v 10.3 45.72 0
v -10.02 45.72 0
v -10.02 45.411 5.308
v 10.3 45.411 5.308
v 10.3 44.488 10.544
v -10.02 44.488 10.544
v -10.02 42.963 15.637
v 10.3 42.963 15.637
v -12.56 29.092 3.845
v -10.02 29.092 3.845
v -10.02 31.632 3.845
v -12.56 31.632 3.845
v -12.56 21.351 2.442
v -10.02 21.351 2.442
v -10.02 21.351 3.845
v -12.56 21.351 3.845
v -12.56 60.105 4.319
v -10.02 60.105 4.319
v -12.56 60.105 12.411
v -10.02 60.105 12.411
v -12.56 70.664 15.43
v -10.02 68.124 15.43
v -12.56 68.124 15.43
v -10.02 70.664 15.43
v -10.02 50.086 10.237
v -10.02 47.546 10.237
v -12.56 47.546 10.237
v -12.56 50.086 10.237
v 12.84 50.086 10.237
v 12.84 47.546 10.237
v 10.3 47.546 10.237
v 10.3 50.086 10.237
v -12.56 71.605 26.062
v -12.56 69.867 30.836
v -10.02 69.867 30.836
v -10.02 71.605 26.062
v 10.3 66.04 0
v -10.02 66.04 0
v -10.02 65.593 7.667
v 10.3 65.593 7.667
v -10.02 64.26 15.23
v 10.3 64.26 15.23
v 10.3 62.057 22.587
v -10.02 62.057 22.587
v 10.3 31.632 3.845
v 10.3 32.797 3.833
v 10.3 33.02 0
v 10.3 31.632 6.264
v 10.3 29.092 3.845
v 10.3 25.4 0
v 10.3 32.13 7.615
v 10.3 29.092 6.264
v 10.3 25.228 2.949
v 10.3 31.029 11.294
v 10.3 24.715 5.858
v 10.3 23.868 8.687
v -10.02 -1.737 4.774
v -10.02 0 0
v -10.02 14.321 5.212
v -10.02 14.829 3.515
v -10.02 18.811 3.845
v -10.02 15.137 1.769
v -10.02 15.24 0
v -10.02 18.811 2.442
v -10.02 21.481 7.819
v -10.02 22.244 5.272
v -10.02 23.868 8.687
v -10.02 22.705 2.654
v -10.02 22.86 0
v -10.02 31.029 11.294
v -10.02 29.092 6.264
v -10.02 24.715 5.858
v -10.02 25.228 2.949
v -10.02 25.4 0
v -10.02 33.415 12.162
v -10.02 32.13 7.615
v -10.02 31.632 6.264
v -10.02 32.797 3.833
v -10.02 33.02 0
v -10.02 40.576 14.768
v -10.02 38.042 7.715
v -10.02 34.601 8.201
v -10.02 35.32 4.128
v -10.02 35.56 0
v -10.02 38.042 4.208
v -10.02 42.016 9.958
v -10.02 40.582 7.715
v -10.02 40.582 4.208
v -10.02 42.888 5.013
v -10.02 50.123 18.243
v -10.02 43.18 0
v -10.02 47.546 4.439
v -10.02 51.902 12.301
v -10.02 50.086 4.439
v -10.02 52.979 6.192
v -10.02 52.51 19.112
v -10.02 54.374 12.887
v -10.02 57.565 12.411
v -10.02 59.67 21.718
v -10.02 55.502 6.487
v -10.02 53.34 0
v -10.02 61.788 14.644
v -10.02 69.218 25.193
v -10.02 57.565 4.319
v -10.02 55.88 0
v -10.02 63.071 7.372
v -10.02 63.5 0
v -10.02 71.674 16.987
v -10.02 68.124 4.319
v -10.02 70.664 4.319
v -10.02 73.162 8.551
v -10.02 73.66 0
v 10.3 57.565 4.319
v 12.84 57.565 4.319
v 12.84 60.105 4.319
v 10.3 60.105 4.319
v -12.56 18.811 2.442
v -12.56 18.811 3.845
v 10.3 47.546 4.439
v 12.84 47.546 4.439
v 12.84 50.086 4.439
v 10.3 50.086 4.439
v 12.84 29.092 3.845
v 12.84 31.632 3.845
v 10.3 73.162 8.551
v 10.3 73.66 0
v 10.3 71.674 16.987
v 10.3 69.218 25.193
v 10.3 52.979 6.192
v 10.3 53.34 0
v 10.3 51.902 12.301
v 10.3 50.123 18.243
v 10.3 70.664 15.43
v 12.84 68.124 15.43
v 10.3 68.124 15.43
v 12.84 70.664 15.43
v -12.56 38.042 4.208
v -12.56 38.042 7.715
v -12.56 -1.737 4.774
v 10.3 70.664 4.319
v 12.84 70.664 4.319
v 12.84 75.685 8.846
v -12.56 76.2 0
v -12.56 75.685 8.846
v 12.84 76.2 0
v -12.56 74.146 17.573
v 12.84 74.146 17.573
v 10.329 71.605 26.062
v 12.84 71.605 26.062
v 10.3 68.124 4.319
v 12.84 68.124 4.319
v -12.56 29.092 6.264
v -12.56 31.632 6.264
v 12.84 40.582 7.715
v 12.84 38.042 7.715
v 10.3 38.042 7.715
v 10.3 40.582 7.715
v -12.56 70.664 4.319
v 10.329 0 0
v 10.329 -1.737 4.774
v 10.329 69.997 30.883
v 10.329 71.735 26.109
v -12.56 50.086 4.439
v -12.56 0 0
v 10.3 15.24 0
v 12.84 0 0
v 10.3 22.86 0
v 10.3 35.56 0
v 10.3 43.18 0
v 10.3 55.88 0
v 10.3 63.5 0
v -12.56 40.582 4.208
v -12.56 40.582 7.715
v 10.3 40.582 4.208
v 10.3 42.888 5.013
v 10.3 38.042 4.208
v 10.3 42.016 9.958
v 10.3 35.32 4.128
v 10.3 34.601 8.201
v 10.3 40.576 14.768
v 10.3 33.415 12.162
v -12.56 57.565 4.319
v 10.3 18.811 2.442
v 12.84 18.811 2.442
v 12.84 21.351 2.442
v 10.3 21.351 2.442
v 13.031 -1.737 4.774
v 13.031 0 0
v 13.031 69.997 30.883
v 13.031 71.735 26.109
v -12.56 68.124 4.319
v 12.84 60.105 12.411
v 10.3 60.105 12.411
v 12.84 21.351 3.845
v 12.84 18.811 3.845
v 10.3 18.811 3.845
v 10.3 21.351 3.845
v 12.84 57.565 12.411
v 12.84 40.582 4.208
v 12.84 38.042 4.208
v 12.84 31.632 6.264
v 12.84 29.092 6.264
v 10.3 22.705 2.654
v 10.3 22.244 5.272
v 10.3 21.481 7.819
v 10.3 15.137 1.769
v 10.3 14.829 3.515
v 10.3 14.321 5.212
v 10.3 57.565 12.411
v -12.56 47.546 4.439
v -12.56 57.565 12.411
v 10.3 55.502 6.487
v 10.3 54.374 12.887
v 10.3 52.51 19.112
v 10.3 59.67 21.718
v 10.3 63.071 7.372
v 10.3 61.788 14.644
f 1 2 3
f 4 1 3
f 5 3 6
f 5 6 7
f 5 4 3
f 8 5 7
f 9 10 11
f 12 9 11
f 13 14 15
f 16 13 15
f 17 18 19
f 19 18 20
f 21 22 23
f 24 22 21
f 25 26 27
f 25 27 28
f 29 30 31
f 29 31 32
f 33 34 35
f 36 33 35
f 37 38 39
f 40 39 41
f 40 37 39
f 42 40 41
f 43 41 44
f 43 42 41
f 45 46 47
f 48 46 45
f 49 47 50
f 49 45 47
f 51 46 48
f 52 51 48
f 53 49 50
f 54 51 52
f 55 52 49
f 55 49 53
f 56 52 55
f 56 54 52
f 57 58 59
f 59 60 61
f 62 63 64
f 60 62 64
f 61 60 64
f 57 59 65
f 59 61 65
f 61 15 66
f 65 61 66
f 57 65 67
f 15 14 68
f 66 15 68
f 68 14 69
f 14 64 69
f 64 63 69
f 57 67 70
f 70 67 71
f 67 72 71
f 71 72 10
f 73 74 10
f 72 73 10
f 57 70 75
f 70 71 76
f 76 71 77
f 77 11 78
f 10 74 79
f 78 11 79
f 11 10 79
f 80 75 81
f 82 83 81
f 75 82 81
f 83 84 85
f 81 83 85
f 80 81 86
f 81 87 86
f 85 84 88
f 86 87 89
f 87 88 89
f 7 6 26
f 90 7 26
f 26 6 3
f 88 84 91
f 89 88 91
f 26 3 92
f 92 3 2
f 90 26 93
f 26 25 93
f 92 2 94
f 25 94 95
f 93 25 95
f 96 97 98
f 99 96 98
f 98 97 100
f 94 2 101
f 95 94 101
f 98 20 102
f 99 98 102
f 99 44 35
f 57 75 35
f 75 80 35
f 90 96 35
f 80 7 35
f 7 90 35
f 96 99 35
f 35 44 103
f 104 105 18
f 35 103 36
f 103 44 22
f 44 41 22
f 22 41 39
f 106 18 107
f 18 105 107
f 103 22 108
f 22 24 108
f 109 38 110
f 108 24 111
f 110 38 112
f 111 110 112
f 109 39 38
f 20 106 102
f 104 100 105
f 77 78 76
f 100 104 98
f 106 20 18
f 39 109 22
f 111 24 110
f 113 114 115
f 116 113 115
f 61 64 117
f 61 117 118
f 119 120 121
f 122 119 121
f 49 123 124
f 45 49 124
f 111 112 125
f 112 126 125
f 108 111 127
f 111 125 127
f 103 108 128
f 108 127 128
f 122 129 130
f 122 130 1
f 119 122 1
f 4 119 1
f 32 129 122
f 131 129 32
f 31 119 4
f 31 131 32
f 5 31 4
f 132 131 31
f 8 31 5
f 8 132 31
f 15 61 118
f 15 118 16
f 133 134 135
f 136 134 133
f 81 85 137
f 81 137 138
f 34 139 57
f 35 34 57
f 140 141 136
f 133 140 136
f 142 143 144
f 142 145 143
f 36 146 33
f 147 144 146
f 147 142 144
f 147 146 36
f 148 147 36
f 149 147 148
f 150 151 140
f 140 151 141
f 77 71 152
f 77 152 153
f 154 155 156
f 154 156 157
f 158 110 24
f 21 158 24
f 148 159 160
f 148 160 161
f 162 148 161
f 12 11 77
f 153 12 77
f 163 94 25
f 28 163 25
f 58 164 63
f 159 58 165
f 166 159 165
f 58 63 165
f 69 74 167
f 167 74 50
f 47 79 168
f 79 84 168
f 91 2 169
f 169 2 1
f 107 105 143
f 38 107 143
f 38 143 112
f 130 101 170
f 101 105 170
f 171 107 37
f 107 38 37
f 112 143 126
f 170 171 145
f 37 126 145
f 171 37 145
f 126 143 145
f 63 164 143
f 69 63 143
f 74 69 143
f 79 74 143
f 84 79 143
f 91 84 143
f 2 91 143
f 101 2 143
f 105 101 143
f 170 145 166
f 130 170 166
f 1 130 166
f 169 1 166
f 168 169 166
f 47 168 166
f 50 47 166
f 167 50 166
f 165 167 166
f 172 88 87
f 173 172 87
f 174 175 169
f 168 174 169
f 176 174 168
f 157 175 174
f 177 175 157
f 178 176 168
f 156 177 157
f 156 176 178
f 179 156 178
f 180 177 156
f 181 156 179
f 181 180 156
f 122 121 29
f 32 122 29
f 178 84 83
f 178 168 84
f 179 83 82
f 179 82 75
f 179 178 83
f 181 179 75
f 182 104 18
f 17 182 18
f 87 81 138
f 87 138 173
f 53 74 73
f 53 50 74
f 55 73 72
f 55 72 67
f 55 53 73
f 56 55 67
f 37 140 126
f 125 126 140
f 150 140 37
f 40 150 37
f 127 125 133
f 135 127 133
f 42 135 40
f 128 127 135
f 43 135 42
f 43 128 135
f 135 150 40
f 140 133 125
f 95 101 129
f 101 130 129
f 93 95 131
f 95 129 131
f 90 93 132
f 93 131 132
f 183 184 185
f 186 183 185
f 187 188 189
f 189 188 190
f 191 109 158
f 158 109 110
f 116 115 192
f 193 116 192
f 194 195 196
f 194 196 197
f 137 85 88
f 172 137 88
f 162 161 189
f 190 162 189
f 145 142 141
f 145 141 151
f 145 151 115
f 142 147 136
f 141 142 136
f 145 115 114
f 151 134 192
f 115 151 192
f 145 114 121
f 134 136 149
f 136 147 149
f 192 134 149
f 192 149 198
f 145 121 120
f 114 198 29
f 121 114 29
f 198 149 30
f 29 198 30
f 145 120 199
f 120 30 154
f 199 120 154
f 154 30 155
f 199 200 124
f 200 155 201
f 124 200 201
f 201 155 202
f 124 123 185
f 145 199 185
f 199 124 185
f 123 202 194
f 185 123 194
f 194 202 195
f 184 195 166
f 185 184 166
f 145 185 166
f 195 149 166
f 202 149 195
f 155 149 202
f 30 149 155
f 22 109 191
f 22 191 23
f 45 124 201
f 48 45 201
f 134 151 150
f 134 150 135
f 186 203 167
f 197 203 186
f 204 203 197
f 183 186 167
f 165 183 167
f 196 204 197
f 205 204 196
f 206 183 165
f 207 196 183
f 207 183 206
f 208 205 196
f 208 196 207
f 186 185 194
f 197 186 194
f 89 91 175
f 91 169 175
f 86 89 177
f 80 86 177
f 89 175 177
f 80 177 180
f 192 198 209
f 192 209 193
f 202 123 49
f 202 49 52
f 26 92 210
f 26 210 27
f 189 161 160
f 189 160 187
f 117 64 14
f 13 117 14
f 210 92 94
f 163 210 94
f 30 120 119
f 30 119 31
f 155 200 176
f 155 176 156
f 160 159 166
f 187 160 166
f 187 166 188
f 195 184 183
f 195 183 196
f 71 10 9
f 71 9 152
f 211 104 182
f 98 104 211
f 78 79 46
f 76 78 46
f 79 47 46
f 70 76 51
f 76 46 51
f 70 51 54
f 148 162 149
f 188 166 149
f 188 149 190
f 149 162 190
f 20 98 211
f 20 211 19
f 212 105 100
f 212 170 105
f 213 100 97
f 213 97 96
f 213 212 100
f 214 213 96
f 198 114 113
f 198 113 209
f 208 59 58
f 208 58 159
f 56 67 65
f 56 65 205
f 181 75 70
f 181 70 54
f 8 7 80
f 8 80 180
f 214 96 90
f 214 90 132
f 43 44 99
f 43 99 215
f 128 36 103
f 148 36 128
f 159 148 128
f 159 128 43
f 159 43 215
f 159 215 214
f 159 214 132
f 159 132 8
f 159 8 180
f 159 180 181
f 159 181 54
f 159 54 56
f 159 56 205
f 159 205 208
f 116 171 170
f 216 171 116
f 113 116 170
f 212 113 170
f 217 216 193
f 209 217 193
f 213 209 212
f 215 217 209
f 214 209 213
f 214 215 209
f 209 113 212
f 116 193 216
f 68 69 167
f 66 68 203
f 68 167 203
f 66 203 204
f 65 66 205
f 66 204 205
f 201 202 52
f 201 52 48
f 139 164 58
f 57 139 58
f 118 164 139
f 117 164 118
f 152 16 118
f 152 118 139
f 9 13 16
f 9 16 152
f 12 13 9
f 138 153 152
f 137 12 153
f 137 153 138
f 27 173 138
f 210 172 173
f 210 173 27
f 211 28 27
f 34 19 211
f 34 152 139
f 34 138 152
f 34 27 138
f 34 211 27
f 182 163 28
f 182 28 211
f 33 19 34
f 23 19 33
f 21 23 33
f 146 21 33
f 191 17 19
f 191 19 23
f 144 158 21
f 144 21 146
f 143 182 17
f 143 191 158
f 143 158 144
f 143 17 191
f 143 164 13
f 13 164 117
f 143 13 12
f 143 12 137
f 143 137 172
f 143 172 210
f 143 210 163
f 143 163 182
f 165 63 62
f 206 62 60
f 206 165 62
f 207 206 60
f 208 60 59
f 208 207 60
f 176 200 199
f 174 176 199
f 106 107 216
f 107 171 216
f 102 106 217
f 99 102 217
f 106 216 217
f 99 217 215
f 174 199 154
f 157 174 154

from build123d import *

# Parameters (mm, degrees)
F0_W     = 25.4
F0_H     = 76.2
F0_W_2   = 20.32
F0_H_2   = 7.62
F1_ANGLE = 20
F2_W     = 2.54
F2_H     = 76.2
F2_W_2   = 2.7023823932
F2_H_2   = 76.3387009501
F3_DEPTH = 5.08
F4_W     = 2.54
F4_H     = 11.1115600293
F4_H_2   = 8.0921141291
F4_H_3   = 5.7973351781
F4_H_4   = 3.5076183132
F4_H_5   = 2.4190474503
F4_H_6   = 1.4033722508
F5_DEPTH = 25.401


with BuildPart() as f1:
    # F0 (on Top) → F1 (revolve)
    with BuildSketch(Plane.XY):
        with Locations((0.1395599202, 38.1)):
            Rectangle(F0_W, F0_H)
        with Locations((0.1395599202, 19.05)):
            Rectangle(F0_W_2, F0_H_2, mode=Mode.SUBTRACT)
        with Locations((0.1395599202, 29.21)):
            Rectangle(F0_W_2, F0_H_2, mode=Mode.SUBTRACT)
        with Locations((0.1395599202, 39.37)):
            Rectangle(F0_W_2, F0_H_2, mode=Mode.SUBTRACT)
        with Locations((0.1395599202, 49.53)):
            Rectangle(F0_W_2, F0_H_2, mode=Mode.SUBTRACT)
        with Locations((0.1395599202, 59.69)):
            Rectangle(F0_W_2, F0_H_2, mode=Mode.SUBTRACT)
        with Locations((0.1395599202, 69.85)):
            Rectangle(F0_W_2, F0_H_2, mode=Mode.SUBTRACT)
    revolve(axis=Axis((0.1395599202, 0, 0), (1, 0, 0)), revolution_arc=F1_ANGLE)

    # F2 (on face) → F3 (join)
    with BuildSketch(Plane(origin=(0, 0, 0), x_dir=(1, 0, 0), z_dir=(0, -0.3420201433, 0.9396926208))):
        with Locations((-11.2904400798, 38.1)):
            Rectangle(F2_W, F2_H)
        with Locations((11.6798062809, 38.1693504751)):
            Rectangle(F2_W_2, F2_H_2)
    extrude(amount=F3_DEPTH)

    # F4 (on face) → F5 (cut, through all)
    with BuildSketch(Plane.YZ.offset(12.8395599202)):
        with Locations((69.3939362815, 9.8744578206)):
            Rectangle(F4_W, F4_H)
        with Locations((58.834955257, 8.3647348704)):
            Rectangle(F4_W, F4_H_2)
        with Locations((48.8164393489, 7.3381234978)):
            Rectangle(F4_W, F4_H_3)
        with Locations((39.3121916656, 5.9616579595)):
            Rectangle(F4_W, F4_H_4)
        with Locations((30.3617200801, 5.0545152959)):
            Rectangle(F4_W, F4_H_5)
        with Locations((20.0811068022, 3.1433054453)):
            Rectangle(F4_W, F4_H_6)
    extrude(amount=-F5_DEPTH, mode=Mode.SUBTRACT)


solid = f1.part
